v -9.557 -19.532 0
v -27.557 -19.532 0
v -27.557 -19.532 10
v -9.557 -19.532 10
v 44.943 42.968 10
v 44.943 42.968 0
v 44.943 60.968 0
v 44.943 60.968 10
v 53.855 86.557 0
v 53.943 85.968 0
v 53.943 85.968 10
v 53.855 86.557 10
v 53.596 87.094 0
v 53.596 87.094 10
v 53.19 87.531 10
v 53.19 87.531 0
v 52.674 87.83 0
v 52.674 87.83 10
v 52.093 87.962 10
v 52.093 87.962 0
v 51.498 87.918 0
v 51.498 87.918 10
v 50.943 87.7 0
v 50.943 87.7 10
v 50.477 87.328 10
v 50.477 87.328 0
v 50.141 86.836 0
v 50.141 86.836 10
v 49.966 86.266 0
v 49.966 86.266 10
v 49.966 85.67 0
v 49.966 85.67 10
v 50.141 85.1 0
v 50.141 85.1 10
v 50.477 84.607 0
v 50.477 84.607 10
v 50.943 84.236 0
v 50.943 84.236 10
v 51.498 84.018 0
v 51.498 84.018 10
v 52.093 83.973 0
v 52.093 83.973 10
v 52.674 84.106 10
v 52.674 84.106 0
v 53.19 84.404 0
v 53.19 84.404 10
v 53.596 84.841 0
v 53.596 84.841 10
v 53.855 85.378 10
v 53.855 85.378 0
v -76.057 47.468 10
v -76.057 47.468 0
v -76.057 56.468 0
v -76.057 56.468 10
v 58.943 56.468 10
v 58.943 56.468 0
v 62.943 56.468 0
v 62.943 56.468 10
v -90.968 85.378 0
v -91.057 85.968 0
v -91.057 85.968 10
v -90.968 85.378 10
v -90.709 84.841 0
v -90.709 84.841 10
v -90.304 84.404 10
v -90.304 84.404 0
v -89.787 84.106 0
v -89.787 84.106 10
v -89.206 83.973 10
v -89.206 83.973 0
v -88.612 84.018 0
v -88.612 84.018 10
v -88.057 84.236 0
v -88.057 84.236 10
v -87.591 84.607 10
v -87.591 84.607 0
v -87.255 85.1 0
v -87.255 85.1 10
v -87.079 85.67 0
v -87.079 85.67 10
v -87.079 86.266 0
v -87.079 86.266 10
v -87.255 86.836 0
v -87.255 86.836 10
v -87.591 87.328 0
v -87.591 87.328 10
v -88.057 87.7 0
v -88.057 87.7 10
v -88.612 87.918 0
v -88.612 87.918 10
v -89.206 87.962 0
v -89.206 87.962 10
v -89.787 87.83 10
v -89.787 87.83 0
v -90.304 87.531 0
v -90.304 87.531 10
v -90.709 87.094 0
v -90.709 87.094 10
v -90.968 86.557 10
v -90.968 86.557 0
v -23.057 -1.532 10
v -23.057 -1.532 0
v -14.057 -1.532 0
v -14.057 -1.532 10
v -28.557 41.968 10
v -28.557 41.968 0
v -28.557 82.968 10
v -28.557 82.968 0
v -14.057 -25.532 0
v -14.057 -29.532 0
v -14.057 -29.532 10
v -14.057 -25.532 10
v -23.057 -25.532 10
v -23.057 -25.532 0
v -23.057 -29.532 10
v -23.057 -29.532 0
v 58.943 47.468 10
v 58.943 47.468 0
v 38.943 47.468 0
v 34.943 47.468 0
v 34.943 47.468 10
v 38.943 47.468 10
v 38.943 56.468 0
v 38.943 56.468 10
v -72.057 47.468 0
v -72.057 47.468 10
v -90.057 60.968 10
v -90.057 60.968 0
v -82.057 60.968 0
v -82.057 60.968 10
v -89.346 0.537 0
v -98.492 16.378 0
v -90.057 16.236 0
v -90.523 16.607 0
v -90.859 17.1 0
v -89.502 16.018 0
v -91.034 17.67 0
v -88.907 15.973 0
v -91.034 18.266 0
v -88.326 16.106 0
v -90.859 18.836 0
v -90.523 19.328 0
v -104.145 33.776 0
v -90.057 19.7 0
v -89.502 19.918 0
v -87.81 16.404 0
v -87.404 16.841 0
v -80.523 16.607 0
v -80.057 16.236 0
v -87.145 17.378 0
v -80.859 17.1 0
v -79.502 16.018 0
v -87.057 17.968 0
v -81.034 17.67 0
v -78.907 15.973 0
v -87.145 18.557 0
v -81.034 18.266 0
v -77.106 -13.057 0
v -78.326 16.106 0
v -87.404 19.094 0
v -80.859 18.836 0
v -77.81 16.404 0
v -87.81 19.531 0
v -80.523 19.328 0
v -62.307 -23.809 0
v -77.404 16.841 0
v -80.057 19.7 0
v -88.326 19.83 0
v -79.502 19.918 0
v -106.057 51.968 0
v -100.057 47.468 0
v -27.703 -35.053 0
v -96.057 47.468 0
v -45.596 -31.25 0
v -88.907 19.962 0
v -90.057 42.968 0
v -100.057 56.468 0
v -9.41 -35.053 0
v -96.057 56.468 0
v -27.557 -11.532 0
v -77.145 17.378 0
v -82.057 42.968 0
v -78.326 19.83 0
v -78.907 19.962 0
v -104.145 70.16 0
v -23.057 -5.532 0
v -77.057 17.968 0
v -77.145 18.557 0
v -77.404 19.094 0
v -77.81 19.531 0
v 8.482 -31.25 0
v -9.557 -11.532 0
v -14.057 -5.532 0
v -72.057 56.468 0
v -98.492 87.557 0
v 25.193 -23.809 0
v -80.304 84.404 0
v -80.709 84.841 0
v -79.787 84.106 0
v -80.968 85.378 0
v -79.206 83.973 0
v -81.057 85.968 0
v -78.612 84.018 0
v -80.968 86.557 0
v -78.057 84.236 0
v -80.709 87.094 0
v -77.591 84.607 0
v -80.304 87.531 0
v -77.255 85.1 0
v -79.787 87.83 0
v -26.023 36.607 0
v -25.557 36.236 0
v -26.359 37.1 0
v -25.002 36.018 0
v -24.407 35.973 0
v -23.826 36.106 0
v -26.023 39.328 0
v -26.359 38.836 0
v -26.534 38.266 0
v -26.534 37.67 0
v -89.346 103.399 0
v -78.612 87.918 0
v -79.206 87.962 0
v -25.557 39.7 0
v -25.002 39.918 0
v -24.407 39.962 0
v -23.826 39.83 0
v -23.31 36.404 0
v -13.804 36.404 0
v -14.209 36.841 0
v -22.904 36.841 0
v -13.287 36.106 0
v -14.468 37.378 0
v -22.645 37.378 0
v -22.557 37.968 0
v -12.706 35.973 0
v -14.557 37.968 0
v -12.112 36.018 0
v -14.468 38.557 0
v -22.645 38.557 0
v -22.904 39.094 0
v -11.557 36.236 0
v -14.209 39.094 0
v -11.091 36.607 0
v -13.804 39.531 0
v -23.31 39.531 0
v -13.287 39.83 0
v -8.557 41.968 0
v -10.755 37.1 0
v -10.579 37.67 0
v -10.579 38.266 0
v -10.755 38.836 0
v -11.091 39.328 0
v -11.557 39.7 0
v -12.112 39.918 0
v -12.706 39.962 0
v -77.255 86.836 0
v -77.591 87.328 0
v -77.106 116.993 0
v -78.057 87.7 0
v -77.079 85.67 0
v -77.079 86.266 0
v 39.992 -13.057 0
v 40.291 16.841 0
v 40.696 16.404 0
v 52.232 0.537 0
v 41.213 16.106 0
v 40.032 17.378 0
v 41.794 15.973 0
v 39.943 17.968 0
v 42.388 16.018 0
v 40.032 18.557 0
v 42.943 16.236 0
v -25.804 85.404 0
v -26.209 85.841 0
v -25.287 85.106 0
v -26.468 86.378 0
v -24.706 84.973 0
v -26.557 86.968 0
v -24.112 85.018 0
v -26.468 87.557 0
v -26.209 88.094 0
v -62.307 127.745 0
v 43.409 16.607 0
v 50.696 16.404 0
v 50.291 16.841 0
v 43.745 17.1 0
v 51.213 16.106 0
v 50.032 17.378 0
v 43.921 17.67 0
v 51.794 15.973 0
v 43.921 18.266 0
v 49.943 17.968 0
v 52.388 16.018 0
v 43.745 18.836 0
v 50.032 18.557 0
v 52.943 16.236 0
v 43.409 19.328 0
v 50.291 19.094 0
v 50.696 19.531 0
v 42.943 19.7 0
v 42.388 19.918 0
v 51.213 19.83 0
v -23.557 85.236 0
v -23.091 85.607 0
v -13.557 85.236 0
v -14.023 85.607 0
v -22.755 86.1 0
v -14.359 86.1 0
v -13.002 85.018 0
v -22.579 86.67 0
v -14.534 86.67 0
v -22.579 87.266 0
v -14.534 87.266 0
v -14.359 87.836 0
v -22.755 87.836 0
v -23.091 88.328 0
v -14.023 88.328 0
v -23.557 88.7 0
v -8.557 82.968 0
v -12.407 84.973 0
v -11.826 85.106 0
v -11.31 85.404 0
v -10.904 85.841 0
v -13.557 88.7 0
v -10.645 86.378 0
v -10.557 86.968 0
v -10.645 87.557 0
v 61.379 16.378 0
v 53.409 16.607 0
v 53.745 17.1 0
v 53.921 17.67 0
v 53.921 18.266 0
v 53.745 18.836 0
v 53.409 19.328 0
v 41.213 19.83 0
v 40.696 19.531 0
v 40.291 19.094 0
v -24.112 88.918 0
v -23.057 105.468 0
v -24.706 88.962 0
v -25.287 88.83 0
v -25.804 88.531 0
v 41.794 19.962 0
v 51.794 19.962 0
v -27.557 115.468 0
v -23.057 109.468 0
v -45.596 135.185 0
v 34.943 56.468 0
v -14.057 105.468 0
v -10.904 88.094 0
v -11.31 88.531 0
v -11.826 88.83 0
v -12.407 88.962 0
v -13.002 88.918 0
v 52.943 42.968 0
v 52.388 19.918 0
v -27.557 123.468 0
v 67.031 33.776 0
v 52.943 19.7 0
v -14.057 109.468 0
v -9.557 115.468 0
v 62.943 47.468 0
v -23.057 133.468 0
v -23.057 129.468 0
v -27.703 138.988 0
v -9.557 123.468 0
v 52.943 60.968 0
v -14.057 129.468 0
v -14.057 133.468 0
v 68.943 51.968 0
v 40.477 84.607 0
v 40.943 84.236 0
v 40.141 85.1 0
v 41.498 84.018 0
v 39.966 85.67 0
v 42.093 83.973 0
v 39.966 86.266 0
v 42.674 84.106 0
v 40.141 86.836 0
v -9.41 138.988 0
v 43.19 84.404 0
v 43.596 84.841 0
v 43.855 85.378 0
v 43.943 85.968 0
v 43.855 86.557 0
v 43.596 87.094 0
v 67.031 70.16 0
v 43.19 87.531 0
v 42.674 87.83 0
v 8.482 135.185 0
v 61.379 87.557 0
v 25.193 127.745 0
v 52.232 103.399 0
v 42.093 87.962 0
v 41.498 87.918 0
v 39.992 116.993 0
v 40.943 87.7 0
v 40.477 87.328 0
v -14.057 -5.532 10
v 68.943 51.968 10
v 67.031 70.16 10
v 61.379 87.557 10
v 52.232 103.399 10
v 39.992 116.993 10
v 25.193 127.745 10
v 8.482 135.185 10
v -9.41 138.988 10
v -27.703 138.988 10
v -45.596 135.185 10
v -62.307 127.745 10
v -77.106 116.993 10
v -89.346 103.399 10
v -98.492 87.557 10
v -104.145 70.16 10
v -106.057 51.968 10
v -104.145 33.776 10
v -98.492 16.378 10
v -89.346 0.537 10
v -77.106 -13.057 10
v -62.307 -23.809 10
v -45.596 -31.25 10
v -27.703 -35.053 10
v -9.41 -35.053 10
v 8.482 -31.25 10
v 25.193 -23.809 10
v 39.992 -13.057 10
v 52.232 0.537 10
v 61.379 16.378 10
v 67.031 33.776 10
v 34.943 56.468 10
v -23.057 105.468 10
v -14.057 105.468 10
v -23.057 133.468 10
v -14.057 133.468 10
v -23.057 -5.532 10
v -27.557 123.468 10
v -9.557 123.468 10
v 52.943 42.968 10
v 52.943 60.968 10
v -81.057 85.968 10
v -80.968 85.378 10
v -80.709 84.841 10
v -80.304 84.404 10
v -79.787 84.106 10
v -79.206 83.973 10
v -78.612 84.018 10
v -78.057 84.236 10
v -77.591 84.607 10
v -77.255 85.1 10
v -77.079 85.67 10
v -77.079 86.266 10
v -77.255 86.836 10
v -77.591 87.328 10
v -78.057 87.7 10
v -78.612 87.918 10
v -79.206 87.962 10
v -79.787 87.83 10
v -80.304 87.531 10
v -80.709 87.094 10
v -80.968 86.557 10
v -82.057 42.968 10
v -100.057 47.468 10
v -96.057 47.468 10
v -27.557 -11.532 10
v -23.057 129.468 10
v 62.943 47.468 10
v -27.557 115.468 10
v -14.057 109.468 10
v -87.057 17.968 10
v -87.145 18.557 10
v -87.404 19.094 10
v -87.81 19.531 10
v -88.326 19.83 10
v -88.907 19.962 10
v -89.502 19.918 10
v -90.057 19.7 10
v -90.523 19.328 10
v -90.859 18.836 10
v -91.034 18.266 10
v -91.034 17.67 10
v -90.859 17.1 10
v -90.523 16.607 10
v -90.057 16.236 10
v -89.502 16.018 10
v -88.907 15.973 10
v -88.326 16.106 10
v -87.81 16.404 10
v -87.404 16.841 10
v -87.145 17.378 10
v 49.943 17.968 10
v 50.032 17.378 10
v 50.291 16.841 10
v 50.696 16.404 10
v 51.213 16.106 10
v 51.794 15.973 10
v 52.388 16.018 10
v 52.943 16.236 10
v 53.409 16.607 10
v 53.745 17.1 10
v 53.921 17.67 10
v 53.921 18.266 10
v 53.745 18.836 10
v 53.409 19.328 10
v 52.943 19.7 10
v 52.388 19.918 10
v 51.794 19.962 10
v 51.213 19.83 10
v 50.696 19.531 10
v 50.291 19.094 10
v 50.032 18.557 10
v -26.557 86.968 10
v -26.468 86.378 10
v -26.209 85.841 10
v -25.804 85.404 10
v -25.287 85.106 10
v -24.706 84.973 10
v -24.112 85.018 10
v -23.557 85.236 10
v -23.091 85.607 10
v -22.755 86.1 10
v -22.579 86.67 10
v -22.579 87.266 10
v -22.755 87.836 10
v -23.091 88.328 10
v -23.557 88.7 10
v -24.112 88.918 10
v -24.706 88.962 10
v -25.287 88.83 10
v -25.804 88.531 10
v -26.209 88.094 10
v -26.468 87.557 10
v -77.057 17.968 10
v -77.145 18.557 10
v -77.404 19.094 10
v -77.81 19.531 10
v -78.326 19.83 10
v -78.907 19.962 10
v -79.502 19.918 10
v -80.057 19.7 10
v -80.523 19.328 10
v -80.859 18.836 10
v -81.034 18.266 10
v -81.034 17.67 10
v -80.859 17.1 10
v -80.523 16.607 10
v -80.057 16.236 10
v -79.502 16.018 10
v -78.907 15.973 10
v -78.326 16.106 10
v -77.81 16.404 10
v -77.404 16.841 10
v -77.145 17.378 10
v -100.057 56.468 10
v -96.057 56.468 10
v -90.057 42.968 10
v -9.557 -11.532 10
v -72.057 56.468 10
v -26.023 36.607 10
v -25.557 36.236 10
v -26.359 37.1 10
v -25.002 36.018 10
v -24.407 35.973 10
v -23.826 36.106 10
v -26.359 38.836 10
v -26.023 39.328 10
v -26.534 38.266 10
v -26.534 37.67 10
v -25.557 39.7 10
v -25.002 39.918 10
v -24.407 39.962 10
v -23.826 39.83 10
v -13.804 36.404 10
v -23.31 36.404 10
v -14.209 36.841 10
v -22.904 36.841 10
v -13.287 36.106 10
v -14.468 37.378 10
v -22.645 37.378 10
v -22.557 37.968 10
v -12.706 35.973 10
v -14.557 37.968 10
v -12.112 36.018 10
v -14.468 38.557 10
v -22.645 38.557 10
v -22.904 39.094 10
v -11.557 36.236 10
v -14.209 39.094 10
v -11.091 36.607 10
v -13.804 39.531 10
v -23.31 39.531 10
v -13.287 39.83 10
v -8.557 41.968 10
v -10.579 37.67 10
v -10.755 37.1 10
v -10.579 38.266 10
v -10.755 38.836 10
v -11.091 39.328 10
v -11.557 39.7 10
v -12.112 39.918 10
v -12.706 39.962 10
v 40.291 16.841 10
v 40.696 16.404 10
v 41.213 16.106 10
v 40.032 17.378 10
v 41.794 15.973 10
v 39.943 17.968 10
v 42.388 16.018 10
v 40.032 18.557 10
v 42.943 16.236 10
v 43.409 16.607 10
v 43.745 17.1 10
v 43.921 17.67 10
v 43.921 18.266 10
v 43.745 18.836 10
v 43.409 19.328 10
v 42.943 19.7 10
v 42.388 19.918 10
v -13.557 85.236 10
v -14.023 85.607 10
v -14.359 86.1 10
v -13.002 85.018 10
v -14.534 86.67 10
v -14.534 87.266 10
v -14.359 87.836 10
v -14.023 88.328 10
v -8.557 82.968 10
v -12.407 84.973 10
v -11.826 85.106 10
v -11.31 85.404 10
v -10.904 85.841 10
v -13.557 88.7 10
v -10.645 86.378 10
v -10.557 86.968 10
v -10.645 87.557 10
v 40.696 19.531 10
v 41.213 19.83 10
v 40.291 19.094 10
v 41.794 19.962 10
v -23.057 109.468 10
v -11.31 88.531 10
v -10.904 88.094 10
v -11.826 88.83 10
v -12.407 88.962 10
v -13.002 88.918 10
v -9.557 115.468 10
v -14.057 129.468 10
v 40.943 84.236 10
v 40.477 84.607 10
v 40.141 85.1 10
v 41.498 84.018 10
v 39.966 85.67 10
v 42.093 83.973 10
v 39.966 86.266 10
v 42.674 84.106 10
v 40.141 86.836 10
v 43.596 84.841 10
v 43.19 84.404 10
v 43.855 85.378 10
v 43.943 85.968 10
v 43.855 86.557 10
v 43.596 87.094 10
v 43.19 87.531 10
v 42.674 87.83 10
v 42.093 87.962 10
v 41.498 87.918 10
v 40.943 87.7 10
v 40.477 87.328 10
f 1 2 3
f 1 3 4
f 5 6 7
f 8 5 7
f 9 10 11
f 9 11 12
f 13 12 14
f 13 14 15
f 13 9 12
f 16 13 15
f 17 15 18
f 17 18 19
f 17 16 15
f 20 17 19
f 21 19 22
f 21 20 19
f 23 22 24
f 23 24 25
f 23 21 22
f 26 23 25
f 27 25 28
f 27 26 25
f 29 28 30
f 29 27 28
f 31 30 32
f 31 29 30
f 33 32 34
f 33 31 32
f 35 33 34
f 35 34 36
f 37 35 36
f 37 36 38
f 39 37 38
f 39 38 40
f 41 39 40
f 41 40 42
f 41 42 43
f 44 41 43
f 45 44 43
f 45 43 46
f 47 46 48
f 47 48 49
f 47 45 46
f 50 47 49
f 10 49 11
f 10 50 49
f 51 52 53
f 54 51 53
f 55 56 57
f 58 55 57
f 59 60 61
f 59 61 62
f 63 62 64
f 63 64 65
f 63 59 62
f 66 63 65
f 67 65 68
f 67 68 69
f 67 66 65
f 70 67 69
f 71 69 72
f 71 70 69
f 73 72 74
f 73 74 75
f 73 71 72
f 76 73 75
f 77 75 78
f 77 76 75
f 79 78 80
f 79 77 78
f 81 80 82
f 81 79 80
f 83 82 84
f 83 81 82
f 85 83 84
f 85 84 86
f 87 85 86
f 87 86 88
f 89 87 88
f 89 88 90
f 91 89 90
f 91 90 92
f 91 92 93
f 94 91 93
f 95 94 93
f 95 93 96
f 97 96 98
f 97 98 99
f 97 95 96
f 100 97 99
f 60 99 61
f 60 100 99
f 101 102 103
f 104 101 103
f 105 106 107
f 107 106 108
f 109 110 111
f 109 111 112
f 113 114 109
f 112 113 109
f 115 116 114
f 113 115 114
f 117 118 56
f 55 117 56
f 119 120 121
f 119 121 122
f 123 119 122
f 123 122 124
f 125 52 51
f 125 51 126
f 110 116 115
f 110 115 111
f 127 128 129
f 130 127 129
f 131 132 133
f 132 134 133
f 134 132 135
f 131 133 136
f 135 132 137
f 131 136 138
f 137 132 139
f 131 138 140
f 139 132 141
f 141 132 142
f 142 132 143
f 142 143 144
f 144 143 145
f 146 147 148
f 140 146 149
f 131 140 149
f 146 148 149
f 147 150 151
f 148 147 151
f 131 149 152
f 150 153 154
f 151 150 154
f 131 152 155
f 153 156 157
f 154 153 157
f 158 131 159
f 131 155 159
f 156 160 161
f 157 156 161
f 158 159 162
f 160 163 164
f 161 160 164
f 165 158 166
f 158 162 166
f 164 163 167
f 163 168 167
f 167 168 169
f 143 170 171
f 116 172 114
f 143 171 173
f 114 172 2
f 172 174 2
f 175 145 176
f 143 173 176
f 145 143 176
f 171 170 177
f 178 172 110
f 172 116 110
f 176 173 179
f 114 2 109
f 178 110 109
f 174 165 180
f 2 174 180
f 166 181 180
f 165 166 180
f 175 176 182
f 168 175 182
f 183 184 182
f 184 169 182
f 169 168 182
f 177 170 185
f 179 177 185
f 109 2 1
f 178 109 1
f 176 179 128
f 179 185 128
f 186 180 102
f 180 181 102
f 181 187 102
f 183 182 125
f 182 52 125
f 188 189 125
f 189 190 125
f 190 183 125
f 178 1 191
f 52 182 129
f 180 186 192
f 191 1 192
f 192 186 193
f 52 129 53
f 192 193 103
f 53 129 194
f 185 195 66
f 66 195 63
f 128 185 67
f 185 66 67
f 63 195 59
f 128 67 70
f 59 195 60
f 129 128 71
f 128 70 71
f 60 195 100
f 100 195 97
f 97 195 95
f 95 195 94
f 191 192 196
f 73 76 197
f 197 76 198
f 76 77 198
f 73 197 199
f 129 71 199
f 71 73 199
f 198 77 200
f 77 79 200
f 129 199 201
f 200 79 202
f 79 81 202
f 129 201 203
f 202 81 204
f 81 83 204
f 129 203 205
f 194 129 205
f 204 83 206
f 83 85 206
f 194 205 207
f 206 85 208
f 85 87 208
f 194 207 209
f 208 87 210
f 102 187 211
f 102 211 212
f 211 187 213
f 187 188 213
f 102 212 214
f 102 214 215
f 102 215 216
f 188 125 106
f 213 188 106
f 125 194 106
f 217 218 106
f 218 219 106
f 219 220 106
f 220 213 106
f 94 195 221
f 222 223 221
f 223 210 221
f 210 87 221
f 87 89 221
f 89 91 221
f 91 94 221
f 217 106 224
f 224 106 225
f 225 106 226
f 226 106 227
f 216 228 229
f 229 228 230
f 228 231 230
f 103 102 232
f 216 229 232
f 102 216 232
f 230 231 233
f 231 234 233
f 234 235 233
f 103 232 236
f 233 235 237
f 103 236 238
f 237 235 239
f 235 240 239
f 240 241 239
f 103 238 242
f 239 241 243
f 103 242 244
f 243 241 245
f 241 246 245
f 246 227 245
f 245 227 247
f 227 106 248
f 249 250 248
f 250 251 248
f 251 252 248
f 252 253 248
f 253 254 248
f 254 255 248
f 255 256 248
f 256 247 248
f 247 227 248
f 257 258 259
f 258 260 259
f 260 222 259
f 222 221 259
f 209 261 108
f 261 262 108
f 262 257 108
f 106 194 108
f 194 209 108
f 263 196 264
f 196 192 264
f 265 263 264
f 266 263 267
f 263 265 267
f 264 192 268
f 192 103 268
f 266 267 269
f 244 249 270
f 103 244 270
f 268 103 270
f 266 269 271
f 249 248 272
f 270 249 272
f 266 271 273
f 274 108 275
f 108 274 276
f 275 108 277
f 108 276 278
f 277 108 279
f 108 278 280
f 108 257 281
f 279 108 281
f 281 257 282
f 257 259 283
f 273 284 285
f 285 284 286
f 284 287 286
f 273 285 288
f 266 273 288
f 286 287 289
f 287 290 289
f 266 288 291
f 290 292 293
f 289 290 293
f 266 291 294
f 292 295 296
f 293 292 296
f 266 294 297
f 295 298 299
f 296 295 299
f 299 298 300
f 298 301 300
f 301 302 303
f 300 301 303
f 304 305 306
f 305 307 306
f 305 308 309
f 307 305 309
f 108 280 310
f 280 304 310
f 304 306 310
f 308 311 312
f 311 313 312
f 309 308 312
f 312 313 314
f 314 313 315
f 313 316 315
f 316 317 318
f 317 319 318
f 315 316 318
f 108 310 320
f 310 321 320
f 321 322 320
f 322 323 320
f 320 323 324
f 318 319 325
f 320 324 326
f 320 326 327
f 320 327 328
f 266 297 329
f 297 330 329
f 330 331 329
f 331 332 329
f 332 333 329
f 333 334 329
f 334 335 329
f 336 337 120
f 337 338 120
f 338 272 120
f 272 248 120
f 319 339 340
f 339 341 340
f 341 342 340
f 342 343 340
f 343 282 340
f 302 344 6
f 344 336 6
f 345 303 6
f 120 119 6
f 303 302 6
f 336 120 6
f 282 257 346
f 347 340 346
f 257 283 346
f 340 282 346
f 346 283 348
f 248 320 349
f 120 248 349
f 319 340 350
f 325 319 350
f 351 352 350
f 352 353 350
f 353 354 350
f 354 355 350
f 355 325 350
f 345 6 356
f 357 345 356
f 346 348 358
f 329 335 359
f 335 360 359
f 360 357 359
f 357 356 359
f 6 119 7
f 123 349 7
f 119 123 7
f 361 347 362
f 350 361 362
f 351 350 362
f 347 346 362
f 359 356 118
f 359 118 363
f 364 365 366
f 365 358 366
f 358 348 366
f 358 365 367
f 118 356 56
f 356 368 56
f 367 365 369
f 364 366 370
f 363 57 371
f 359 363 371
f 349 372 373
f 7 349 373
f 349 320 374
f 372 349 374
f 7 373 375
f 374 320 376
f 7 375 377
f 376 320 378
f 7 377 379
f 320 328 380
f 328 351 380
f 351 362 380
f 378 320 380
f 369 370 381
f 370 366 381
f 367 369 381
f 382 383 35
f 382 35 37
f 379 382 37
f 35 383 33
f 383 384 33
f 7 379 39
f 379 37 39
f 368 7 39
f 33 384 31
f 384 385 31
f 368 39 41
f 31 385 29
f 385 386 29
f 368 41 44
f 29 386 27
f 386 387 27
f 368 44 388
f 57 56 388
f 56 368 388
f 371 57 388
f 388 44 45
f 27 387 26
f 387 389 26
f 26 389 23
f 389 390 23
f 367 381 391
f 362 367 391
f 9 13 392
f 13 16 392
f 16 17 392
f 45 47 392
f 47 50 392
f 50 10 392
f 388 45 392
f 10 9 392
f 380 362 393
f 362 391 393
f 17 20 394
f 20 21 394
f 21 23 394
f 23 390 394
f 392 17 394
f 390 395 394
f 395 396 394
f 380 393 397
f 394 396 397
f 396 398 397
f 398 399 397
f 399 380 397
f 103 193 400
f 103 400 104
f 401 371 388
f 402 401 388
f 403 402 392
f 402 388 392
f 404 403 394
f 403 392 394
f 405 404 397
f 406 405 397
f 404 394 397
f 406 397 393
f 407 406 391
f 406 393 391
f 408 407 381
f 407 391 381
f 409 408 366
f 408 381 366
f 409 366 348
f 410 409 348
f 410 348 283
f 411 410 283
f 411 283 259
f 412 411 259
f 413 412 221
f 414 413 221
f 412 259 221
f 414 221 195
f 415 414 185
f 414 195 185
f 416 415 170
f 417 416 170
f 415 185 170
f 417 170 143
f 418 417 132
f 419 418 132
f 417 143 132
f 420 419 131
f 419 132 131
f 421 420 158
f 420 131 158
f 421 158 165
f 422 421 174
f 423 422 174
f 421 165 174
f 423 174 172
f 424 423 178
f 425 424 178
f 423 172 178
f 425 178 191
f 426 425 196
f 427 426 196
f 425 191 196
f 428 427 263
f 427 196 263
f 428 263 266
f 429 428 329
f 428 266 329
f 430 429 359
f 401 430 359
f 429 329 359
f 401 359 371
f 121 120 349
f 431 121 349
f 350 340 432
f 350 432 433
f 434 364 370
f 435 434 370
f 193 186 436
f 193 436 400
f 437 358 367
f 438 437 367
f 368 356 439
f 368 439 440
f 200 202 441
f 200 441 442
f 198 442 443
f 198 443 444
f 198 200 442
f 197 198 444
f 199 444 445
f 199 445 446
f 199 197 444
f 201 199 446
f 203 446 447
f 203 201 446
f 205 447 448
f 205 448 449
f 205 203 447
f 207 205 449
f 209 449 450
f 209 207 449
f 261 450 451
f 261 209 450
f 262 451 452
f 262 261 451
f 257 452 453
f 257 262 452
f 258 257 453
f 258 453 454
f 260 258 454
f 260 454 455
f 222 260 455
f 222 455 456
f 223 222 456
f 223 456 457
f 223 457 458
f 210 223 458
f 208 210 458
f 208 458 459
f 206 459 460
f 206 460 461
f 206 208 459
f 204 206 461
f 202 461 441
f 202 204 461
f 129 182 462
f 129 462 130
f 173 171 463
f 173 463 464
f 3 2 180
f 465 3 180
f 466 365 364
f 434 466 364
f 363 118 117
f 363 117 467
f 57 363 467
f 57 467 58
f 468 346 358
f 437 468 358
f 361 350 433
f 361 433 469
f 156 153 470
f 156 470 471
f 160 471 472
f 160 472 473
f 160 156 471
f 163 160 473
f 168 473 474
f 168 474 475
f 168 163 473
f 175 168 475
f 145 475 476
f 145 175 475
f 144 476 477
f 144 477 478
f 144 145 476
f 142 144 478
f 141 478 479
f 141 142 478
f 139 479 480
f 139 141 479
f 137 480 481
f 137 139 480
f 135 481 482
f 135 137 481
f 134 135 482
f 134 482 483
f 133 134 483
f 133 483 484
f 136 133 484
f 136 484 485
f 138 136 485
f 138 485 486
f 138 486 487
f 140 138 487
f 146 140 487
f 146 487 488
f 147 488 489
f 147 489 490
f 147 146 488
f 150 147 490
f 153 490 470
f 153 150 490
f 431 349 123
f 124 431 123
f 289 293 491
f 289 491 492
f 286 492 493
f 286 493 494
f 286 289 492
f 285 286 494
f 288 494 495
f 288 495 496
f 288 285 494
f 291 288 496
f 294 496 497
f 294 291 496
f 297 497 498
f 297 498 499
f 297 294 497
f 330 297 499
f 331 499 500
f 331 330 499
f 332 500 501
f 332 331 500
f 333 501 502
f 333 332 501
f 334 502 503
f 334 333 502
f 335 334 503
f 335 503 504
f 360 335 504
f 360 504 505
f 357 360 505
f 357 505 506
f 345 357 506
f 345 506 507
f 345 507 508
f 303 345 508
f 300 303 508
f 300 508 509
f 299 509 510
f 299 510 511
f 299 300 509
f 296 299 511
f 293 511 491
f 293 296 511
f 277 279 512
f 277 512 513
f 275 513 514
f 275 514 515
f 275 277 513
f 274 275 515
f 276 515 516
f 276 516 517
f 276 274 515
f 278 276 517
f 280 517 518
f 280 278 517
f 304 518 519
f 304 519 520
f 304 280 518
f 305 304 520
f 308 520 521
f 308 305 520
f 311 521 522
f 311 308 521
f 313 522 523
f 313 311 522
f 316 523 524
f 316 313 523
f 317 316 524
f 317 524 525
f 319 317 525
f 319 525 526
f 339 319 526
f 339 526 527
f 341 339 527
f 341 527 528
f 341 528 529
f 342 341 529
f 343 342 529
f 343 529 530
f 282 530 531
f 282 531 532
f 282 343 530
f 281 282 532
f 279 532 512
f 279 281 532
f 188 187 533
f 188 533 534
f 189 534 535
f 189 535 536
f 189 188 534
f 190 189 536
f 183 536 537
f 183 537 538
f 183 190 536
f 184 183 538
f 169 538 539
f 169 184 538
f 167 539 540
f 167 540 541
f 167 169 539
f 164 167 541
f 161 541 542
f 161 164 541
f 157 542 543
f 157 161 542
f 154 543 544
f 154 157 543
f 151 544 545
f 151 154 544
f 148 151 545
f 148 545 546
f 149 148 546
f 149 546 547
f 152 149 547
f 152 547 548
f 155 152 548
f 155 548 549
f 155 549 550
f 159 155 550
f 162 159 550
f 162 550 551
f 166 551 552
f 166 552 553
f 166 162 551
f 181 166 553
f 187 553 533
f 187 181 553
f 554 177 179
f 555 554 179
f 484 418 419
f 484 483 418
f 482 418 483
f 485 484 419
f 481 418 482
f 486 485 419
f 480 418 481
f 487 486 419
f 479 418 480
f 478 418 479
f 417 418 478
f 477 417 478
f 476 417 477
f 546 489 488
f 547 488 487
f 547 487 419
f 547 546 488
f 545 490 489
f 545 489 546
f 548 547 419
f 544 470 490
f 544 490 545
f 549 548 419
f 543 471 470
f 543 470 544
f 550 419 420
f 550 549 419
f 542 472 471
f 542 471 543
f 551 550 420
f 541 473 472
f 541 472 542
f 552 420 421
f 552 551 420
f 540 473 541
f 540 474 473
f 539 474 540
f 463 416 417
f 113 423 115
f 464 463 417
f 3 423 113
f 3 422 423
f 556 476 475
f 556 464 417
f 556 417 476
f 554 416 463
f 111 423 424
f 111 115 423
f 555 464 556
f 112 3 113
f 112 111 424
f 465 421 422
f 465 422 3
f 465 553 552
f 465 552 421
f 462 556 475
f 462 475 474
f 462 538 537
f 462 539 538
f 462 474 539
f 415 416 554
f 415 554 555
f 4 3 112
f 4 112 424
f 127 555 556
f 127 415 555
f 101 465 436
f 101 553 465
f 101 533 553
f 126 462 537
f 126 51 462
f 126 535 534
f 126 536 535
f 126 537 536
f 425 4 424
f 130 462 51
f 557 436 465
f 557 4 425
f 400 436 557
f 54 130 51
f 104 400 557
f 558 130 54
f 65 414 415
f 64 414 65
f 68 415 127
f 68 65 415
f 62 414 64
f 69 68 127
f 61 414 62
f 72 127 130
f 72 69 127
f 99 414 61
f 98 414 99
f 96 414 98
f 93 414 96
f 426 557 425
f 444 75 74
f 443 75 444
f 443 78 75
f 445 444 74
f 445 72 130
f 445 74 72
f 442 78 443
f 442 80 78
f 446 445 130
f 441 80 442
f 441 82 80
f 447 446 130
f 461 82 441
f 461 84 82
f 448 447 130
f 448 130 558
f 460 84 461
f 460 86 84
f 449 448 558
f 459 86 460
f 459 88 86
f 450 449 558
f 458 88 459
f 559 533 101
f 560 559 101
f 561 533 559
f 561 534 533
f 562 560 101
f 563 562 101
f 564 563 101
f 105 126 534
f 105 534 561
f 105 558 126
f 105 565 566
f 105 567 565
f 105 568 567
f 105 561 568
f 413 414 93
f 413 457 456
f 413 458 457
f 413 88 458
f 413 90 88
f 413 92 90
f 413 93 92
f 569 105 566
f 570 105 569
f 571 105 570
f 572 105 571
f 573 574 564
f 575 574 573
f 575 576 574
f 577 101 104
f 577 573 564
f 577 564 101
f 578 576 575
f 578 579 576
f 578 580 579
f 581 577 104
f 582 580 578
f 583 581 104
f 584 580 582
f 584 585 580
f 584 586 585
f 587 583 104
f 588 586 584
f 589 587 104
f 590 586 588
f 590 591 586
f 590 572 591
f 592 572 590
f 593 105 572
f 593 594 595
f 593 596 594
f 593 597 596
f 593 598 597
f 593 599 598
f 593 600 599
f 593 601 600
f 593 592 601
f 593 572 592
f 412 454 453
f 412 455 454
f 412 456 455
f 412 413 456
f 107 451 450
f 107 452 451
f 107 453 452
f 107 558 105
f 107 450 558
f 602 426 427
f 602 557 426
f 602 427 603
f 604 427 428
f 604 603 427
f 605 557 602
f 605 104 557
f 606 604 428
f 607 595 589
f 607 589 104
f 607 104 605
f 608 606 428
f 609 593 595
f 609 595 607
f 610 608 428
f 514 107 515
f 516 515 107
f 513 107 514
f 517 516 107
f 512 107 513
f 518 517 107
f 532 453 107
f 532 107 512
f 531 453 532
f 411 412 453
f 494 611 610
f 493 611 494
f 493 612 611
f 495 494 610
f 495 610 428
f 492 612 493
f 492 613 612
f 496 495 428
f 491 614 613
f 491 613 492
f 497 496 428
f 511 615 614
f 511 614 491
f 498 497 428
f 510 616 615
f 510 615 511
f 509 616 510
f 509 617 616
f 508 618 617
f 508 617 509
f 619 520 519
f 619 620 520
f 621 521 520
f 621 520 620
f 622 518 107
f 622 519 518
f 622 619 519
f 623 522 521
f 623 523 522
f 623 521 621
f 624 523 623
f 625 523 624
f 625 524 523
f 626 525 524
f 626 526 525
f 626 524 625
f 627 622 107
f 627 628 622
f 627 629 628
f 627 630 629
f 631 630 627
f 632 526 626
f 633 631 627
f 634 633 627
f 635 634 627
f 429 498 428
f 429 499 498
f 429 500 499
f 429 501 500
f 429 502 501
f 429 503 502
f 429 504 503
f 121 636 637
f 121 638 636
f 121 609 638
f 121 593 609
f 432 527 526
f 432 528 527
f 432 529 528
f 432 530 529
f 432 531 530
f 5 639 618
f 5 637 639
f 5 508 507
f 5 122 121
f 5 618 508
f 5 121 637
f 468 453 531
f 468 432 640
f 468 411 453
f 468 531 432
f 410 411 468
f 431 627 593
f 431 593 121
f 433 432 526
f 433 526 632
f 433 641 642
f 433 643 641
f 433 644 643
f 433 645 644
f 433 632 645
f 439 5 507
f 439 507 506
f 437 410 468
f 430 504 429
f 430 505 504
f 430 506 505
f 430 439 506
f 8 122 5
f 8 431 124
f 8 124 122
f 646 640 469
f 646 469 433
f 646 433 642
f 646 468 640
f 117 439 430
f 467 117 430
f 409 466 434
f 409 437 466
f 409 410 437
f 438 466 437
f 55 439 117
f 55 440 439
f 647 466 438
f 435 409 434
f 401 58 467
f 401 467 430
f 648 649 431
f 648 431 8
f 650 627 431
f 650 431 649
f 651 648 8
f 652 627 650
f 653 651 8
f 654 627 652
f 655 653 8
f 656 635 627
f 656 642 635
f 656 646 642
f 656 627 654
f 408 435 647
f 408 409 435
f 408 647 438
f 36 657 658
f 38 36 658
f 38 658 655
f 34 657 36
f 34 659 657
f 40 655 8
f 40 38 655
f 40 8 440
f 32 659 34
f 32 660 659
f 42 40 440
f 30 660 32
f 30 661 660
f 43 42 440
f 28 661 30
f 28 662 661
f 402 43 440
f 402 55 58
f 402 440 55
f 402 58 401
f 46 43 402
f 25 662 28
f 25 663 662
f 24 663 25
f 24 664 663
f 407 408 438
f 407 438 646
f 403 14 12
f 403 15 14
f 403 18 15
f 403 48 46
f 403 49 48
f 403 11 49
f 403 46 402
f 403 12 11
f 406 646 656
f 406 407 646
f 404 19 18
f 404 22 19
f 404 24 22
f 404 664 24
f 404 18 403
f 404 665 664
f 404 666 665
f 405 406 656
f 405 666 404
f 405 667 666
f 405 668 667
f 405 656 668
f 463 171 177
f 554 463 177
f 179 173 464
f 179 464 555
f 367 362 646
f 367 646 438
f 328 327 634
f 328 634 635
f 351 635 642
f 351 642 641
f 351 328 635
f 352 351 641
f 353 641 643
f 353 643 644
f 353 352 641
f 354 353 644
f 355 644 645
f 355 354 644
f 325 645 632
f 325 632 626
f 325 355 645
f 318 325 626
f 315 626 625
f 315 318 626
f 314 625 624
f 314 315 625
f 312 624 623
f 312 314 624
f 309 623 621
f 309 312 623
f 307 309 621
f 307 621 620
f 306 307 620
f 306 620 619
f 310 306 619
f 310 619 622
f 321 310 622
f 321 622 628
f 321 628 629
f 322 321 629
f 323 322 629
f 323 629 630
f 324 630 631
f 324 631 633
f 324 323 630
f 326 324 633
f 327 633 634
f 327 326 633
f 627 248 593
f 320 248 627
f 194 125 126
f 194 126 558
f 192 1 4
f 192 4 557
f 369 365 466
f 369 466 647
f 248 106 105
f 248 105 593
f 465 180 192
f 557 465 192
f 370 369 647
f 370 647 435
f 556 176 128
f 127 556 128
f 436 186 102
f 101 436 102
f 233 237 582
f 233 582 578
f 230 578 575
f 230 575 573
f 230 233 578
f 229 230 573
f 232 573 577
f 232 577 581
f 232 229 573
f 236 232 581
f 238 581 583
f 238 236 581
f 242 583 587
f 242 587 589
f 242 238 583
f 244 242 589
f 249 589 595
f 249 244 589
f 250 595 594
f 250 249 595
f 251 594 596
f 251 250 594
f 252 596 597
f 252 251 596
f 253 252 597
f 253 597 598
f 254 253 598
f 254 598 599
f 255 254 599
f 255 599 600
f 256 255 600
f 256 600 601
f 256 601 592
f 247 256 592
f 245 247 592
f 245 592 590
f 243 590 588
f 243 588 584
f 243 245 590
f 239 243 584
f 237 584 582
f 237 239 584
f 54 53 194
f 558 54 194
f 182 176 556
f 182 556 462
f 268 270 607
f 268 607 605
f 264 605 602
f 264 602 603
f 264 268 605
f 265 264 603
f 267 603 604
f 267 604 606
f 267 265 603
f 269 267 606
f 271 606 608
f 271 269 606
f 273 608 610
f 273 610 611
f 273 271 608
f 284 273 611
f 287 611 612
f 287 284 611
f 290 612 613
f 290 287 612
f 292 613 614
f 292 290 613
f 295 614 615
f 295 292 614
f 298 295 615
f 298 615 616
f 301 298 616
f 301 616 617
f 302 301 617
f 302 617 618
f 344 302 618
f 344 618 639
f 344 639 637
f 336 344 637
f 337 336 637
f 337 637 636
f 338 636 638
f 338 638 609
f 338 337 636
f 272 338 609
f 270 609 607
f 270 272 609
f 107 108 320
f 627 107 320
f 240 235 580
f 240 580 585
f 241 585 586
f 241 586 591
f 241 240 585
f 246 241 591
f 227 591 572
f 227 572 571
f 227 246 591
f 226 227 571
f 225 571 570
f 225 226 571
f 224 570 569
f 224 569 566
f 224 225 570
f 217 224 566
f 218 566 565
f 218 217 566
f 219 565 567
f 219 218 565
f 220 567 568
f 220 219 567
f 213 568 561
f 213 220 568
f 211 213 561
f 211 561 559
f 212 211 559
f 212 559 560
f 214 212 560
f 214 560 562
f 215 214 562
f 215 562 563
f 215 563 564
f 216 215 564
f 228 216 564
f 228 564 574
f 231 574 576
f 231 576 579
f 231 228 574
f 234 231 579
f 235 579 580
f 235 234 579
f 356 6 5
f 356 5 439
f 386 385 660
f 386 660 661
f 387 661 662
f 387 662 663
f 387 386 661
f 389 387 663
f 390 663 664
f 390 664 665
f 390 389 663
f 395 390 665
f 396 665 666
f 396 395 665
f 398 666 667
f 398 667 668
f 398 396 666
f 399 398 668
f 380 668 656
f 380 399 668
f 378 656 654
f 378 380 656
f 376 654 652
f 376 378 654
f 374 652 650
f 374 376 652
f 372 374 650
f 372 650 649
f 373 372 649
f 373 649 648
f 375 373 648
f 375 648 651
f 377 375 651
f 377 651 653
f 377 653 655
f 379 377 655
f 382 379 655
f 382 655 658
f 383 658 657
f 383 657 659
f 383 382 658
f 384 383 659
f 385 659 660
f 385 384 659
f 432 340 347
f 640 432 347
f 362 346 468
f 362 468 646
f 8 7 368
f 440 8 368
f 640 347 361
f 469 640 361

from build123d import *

# Parameters (mm, degrees)
SKETCH1_R           = 87.5
SKETCH1_R_2         = 2
SKETCH1_W           = 20
SKETCH1_H           = 41
SKETCH1_W_2         = 18
SKETCH1_H_2         = 8
SKETCH1_W_3         = 8
SKETCH1_H_3         = 18
SKETCH1_W_4         = 9
SKETCH1_H_4         = 4
SKETCH1_W_5         = 4
SKETCH1_H_5         = 9
BOSS_EXTRUDE2_DEPTH = 10


with BuildPart() as part:
    # Sketch1 → Boss-Extrude2 (new body)
    with BuildSketch(Plane.XY):
        with Locations((-18.556626979, 51.967802173)):
            Circle(SKETCH1_R)
        with Locations((41.943373021, 85.967802173)):
            Circle(SKETCH1_R_2, mode=Mode.SUBTRACT)
        with Locations((51.943373021, 85.967802173)):
            Circle(SKETCH1_R_2, mode=Mode.SUBTRACT)
        with Locations((-12.556626979, 86.967802173)):
            Circle(SKETCH1_R_2, mode=Mode.SUBTRACT)
        with Locations(Location((-24.556626979, 86.967802173, 0), (0, 0, 180))):
            Circle(SKETCH1_R_2, mode=Mode.SUBTRACT)
        with Locations(Location((-12.556626979, 37.967802173, 0), (0, 0, 180))):
            Circle(SKETCH1_R_2, mode=Mode.SUBTRACT)
        with Locations((-24.556626979, 37.967802173)):
            Circle(SKETCH1_R_2, mode=Mode.SUBTRACT)
        with Locations(Location((51.943373021, 17.967802173, 0), (0, 0, 180))):
            Circle(SKETCH1_R_2, mode=Mode.SUBTRACT)
        with Locations(Location((41.943373021, 17.967802173, 0), (0, 0, 180))):
            Circle(SKETCH1_R_2, mode=Mode.SUBTRACT)
        with Locations(Location((-89.056626979, 85.967802173, 0), (0, 0, 180))):
            Circle(SKETCH1_R_2, mode=Mode.SUBTRACT)
        with Locations(Location((-79.056626979, 85.967802173, 0), (0, 0, 180))):
            Circle(SKETCH1_R_2, mode=Mode.SUBTRACT)
        with Locations((-79.056626979, 17.967802173)):
            Circle(SKETCH1_R_2, mode=Mode.SUBTRACT)
        with Locations((-89.056626979, 17.967802173)):
            Circle(SKETCH1_R_2, mode=Mode.SUBTRACT)
        with Locations((-18.556626979, 62.467802173)):
            Rectangle(SKETCH1_W, SKETCH1_H, mode=Mode.SUBTRACT)
        with Locations((-18.556626979, -15.532197827)):
            Rectangle(SKETCH1_W_2, SKETCH1_H_2, mode=Mode.SUBTRACT)
        with Locations((-18.556626979, 119.467802173)):
            Rectangle(SKETCH1_W_2, SKETCH1_H_2, mode=Mode.SUBTRACT)
        with Locations((-86.056626979, 51.967802173)):
            Rectangle(SKETCH1_W_3, SKETCH1_H_3, mode=Mode.SUBTRACT)
        with Locations((48.943373021, 51.967802173)):
            Rectangle(SKETCH1_W_3, SKETCH1_H_3, mode=Mode.SUBTRACT)
        with Locations((-18.556626979, 131.467802173)):
            Rectangle(SKETCH1_W_4, SKETCH1_H_4, mode=Mode.SUBTRACT)
        with Locations((-18.556626979, 107.467802173)):
            Rectangle(SKETCH1_W_4, SKETCH1_H_4, mode=Mode.SUBTRACT)
        with Locations((-18.556626979, -27.532197827)):
            Rectangle(SKETCH1_W_4, SKETCH1_H_4, mode=Mode.SUBTRACT)
        with Locations((-18.556626979, -3.532197827)):
            Rectangle(SKETCH1_W_4, SKETCH1_H_4, mode=Mode.SUBTRACT)
        with Locations((60.943373021, 51.967802173)):
            Rectangle(SKETCH1_W_5, SKETCH1_H_5, mode=Mode.SUBTRACT)
        with Locations((36.943373021, 51.967802173)):
            Rectangle(SKETCH1_W_5, SKETCH1_H_5, mode=Mode.SUBTRACT)
        with Locations((-74.056626979, 51.967802173)):
            Rectangle(SKETCH1_W_5, SKETCH1_H_5, mode=Mode.SUBTRACT)
        with Locations((-98.056626979, 51.967802173)):
            Rectangle(SKETCH1_W_5, SKETCH1_H_5, mode=Mode.SUBTRACT)
    extrude(amount=BOSS_EXTRUDE2_DEPTH)


solid = part.part
